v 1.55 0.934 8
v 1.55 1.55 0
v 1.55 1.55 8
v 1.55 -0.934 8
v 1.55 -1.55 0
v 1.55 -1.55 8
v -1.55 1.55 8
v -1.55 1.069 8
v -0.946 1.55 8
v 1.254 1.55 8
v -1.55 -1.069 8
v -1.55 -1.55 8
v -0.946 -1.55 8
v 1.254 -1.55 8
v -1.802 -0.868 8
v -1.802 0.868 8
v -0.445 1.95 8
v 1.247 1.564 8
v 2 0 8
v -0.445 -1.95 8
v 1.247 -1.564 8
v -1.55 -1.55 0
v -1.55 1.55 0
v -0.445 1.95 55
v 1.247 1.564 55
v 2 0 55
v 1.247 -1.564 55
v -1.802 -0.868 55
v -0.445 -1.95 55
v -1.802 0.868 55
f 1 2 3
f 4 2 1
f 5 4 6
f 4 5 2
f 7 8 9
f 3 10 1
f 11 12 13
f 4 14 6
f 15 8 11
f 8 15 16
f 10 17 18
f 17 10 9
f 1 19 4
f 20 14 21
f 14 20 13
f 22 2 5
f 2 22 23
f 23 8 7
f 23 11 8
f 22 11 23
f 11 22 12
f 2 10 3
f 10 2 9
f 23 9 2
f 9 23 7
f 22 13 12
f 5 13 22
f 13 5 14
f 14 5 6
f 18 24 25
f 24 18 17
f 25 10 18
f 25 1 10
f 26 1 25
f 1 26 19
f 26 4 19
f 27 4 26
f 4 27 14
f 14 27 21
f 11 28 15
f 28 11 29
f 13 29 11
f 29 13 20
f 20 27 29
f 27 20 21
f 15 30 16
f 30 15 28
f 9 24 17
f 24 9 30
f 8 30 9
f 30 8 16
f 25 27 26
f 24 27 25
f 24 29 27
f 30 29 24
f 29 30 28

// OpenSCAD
//This is my attempt to model a Tap.


//Create a tap by specifying size of square, length of square, shank length, thread length
module Tap(diameter,sqrSize,sqrLength,shankLength,threadLength)
	{
	echo("********************************************");
	echo("Creating tap with following dimensions");
	echo("Diameter: ",diameter);
	echo("Square size: ",sqrSize);
	echo("Square length: ",sqrLength);
	echo("Shank Length: ",shankLength);
	echo("Thread Length: ",threadLength);
	echo("********************************************");

	//square key
	translate([-sqrSize/2,-sqrSize/2,0]) cube([sqrSize,sqrSize,sqrLength]);
	
	//shank
	translate([0,0,sqrLength])cylinder(shankLength,diameter/2,diameter/2);

	//thread
	translate([0,0,sqrLength+shankLength])cylinder(threadLength,diameter/2,diameter/2);

	}

//Parameters ***********************************

//tap diameter
diameter=4;

//Square Size
sqrSize=3.1;

//square length
sqrLength=8;

//Shank length
shankLength=23;

//depth of head
threadLength=24;

//**********************************************

Tap(diameter,sqrSize,sqrLength,shankLength,threadLength);
